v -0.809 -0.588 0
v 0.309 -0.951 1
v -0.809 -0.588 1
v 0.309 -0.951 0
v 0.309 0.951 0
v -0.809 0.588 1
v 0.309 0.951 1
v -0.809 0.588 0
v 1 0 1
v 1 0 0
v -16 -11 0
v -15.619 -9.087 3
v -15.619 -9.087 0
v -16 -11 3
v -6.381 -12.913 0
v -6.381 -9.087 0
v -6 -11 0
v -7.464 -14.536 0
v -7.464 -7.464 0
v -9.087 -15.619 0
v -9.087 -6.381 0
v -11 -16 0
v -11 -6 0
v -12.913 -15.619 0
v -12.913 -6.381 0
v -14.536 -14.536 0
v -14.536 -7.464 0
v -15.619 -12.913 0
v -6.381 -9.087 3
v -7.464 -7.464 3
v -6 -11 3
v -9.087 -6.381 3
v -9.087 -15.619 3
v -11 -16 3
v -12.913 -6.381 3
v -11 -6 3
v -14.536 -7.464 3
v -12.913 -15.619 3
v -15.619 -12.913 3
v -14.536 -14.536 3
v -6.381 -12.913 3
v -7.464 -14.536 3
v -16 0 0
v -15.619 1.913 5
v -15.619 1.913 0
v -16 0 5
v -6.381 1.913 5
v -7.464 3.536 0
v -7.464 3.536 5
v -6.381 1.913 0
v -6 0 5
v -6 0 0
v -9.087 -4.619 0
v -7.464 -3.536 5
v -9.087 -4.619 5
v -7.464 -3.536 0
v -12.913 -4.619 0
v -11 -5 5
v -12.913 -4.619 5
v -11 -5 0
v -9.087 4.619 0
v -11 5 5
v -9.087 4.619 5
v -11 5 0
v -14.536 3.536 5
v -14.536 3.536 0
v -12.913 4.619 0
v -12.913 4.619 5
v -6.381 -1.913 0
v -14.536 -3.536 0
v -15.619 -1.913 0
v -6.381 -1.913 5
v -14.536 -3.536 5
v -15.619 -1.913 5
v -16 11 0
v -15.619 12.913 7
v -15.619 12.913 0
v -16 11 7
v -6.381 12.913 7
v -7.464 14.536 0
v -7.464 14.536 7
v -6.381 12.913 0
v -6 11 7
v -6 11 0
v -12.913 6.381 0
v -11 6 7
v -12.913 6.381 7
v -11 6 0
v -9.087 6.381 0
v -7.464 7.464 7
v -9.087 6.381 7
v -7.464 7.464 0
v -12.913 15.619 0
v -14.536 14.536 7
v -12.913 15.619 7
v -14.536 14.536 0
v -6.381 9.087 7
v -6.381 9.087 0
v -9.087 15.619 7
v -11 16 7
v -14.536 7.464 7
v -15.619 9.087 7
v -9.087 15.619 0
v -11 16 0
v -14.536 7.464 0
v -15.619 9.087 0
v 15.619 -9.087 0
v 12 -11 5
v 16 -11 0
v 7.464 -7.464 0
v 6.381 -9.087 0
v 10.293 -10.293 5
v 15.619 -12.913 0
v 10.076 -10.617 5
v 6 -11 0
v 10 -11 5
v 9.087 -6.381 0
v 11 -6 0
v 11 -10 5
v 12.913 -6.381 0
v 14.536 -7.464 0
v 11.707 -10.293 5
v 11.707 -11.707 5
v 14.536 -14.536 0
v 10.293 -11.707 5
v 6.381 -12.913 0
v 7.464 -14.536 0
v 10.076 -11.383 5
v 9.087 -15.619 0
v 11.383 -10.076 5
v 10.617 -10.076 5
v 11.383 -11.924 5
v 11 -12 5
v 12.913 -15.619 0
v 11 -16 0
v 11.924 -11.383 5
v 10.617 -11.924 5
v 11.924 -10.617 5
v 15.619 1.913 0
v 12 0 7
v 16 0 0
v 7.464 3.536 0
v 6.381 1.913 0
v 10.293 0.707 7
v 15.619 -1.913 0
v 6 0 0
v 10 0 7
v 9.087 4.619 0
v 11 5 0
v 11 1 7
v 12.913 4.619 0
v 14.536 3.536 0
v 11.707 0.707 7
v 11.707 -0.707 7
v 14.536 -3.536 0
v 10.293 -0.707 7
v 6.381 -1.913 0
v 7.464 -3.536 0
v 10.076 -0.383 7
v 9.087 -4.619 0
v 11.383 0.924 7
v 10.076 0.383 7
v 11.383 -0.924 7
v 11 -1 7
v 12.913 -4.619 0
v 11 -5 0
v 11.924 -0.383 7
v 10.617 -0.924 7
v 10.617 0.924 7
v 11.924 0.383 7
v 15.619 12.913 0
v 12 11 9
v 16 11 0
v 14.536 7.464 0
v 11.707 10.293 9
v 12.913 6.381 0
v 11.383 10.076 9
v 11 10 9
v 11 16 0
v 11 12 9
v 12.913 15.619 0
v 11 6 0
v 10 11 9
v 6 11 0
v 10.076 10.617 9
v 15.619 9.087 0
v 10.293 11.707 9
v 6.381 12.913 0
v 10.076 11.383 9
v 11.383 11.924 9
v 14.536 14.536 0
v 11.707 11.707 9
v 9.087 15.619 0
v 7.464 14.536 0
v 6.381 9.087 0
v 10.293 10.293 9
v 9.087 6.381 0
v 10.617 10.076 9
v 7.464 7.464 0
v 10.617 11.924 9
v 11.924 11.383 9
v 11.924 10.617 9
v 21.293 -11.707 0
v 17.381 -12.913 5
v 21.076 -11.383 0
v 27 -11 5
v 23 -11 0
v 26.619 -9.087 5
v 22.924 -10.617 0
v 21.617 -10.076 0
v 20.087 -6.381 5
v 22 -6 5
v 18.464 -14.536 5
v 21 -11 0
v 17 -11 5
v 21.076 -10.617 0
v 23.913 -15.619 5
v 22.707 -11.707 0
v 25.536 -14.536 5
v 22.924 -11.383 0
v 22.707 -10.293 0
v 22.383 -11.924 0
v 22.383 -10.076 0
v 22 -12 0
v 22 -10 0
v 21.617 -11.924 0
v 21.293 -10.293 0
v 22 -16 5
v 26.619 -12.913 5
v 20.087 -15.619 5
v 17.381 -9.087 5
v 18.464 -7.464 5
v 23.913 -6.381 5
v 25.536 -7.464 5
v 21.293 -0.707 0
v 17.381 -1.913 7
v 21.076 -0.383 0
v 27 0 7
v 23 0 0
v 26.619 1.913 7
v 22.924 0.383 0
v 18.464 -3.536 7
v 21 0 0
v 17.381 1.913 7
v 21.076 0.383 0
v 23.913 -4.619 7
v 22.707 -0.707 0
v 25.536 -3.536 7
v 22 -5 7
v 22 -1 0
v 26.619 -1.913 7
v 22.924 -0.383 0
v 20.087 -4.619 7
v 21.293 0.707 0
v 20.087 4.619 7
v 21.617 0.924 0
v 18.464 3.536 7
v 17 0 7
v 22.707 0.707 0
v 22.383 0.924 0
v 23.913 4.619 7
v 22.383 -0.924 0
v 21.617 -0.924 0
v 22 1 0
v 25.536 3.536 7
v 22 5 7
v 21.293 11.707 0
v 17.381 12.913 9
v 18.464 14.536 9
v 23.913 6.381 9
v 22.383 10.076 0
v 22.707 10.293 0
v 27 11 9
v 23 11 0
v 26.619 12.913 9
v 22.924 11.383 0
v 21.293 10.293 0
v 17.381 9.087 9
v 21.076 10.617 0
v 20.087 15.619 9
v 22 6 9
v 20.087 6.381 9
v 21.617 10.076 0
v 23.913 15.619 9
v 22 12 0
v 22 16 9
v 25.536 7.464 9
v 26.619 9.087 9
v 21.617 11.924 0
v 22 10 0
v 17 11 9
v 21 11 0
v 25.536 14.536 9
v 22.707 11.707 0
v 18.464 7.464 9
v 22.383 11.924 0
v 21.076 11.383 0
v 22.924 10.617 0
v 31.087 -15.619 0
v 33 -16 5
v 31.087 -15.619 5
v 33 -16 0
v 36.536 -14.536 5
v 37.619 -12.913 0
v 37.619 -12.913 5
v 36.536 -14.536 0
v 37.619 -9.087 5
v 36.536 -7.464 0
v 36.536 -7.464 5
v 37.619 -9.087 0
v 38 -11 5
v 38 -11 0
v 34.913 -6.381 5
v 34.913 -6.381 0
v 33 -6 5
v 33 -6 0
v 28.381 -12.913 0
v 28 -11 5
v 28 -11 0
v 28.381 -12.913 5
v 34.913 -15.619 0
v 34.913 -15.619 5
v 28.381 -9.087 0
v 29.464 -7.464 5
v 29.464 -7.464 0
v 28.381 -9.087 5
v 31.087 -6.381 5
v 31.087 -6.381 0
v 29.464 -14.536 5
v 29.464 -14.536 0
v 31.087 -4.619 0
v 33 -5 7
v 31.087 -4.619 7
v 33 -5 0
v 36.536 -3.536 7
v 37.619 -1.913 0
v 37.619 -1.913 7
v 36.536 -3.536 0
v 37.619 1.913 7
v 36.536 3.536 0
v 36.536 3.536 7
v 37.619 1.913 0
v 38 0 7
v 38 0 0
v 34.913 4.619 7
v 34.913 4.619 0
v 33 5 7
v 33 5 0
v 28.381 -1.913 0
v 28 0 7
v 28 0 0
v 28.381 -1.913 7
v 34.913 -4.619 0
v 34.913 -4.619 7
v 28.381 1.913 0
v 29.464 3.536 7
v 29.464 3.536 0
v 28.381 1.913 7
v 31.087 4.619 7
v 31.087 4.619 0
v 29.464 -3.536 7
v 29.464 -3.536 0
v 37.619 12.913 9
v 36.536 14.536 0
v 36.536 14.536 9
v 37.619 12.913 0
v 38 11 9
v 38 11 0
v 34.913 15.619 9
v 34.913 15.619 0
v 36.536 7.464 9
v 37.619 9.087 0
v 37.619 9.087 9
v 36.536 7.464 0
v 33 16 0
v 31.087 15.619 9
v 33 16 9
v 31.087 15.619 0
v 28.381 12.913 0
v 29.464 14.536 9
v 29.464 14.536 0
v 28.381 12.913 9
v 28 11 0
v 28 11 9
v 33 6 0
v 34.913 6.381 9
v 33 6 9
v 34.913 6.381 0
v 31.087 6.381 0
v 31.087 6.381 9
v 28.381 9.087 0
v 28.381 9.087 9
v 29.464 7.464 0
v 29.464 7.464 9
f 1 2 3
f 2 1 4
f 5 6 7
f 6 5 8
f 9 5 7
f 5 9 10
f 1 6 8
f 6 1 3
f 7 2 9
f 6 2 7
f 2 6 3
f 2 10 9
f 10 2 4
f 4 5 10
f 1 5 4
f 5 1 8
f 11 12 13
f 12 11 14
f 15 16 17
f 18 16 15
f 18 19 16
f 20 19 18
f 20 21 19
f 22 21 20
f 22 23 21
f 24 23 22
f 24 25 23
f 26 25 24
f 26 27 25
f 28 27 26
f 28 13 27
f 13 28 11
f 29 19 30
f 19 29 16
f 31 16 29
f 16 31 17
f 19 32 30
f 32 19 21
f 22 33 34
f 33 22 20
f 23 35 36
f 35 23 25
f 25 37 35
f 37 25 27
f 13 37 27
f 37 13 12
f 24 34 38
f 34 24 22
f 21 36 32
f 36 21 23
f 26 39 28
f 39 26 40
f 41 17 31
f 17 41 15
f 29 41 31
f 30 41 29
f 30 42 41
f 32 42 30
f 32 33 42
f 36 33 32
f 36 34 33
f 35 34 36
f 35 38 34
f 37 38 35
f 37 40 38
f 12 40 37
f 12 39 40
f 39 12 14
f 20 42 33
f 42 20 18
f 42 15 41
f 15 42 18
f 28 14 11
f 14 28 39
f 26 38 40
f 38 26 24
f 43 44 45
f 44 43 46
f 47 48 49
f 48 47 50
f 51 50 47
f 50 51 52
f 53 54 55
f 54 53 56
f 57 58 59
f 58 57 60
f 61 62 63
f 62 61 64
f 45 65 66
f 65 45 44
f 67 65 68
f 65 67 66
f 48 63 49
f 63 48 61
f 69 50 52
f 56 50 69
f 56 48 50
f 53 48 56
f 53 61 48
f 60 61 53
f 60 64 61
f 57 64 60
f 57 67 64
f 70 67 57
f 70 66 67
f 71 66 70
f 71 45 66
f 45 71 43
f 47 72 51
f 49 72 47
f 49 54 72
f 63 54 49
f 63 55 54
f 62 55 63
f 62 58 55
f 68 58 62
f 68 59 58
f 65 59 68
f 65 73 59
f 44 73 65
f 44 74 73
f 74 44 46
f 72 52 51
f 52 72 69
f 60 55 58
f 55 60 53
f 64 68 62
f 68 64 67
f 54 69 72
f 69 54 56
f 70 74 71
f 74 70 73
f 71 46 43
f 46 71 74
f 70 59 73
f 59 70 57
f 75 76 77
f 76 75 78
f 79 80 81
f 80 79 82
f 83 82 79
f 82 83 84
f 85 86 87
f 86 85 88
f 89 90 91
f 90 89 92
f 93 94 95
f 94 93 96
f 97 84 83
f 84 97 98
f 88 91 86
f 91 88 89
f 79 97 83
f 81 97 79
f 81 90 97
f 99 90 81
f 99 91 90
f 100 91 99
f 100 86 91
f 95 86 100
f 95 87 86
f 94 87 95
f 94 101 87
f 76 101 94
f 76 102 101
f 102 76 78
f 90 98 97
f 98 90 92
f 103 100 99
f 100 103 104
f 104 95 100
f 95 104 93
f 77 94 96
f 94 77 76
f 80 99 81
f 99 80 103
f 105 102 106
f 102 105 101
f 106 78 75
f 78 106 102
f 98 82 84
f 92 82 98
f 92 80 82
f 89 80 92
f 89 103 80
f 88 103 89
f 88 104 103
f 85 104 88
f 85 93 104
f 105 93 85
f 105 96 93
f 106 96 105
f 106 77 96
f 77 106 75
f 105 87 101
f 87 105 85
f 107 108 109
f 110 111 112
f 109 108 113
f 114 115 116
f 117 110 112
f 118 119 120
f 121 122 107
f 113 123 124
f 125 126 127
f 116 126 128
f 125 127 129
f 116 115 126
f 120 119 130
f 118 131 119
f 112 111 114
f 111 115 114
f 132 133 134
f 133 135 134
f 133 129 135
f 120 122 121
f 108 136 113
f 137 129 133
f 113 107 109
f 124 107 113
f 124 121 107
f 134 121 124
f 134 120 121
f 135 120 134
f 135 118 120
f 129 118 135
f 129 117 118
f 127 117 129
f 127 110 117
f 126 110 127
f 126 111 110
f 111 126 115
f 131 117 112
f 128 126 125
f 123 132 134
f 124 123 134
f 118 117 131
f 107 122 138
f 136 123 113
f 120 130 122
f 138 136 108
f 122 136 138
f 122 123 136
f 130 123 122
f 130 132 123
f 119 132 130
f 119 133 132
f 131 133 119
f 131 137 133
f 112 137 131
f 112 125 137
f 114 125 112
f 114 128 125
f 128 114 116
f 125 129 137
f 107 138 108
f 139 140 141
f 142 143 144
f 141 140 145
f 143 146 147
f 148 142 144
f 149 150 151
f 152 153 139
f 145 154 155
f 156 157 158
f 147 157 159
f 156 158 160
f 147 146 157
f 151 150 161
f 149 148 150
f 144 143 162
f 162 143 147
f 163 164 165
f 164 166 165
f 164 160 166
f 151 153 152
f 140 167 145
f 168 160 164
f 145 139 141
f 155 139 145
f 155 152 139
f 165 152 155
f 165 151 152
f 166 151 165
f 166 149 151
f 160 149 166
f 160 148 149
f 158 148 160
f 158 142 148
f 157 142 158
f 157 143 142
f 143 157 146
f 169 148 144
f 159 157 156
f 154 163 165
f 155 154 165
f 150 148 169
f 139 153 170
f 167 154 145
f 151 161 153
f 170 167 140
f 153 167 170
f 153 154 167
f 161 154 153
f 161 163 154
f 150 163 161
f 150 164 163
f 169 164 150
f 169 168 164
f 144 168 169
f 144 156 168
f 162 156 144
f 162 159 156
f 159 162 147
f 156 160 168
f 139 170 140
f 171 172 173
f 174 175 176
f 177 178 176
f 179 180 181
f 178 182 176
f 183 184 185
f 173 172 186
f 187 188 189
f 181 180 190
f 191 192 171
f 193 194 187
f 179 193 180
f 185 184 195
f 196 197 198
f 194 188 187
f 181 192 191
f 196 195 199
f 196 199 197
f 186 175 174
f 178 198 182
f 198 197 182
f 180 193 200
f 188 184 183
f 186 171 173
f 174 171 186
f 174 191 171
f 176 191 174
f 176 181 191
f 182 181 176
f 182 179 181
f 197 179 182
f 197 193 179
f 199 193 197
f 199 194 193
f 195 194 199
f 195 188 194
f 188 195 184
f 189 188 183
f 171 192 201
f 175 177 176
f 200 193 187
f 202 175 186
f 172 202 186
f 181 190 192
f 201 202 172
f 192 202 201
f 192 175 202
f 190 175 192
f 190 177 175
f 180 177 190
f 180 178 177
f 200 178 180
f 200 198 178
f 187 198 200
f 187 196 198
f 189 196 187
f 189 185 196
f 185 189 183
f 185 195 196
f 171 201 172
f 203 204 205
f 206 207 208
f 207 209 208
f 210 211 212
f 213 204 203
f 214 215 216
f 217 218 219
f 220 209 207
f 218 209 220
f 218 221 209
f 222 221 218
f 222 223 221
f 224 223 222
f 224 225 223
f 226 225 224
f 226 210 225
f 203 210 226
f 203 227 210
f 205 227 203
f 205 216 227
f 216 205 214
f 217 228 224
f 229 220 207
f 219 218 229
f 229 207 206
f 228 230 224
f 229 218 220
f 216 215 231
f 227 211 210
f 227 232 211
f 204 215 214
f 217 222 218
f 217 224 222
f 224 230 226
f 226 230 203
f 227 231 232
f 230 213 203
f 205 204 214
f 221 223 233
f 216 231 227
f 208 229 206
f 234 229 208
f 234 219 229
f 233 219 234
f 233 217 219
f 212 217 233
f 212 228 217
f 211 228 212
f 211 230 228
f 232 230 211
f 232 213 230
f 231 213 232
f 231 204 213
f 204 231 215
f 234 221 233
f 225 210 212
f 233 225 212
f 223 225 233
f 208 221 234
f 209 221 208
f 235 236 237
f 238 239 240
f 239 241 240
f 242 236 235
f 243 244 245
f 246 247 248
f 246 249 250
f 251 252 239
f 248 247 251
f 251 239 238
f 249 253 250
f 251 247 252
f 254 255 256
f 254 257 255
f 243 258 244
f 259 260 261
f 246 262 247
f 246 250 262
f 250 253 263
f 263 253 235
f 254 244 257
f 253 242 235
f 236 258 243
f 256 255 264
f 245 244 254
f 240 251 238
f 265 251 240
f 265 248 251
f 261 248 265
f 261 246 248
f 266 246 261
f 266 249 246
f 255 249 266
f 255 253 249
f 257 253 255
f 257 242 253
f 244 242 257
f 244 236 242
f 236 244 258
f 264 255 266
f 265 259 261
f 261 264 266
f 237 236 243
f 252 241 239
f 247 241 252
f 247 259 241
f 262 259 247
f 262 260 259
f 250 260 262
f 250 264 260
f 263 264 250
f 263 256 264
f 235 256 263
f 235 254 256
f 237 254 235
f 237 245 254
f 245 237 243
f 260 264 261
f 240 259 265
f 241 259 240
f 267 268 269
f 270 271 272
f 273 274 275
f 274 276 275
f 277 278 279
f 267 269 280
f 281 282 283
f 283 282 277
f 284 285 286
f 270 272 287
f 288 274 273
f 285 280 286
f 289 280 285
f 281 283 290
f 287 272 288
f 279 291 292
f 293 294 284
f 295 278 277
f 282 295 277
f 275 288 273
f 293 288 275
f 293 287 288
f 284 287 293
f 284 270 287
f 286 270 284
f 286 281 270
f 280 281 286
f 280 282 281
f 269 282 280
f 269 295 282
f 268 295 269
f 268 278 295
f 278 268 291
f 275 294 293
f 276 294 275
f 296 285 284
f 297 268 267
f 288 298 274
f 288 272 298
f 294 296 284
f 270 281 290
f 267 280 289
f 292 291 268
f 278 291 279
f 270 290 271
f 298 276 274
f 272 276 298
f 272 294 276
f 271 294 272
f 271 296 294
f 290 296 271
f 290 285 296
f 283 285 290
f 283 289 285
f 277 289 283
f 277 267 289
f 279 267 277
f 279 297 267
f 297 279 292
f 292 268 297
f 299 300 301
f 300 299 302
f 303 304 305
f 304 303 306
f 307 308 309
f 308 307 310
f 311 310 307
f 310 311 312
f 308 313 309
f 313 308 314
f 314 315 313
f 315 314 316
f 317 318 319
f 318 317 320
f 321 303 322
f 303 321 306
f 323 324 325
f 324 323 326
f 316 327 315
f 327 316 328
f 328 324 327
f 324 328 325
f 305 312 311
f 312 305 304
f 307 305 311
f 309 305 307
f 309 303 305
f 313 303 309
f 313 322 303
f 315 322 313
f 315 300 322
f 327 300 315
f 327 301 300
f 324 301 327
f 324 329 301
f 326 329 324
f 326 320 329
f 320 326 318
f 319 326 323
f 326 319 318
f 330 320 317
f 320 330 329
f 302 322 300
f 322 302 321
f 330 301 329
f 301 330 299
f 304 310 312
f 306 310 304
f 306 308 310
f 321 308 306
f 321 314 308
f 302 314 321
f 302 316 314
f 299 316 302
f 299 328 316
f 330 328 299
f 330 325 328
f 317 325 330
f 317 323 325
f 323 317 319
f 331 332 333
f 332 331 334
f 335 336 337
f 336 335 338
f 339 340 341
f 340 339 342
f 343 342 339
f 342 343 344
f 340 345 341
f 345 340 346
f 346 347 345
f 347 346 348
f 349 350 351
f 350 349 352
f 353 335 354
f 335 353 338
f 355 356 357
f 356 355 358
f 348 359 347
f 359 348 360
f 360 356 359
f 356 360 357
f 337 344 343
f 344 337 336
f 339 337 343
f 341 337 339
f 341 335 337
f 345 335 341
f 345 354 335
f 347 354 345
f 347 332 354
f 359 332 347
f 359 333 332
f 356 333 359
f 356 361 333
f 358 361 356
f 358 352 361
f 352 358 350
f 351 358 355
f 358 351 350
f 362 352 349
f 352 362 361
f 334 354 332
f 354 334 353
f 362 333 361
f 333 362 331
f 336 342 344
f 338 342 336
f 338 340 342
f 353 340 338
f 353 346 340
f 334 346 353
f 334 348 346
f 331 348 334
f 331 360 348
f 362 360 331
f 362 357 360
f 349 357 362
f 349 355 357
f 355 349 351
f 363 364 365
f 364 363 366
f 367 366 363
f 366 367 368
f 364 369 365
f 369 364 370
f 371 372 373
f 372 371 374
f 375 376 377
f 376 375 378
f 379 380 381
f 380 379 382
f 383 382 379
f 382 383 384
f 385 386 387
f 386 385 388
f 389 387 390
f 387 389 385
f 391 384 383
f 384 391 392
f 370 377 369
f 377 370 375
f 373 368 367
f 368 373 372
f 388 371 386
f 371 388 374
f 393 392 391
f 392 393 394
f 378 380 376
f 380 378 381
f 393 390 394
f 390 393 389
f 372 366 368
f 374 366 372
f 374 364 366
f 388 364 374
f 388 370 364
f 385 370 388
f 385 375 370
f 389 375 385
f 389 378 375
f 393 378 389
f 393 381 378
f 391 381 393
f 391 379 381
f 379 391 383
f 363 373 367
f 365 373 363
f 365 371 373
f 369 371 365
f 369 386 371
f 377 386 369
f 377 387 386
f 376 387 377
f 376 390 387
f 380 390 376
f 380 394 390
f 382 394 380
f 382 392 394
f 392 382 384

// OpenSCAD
// Volume: 4086.3752862142446, SurfaceArea: 3436.763766023216
cylinder();
translate([-11,-11,0]) cylinder(h=3, r=5);
translate([-11,  0,0]) cylinder(h=5, d=10);
translate([-11, 11,0]) cylinder(h=7, r=1, d=10);
translate([ 11,-11,0]) cylinder(h=5, r1=5);
translate([ 11,  0,0]) cylinder(h=7, d1=10);
translate([ 11, 11,0]) cylinder(h=9, r1=1, d1=10);
translate([ 22,-11,0]) cylinder(h=5, r2=5);
translate([ 22,  0,0]) cylinder(h=7, d2=10);
translate([ 22, 11,0]) cylinder(h=9, r2=1, d2=10);
translate([ 33,-11,0]) cylinder(h=5, r1=5, r2=5);
translate([ 33,  0,0]) cylinder(h=7, d1=10, d2=10);
translate([ 33, 11,0]) cylinder(h=9, r1=1, d1=10, r2=1, d2=10);
